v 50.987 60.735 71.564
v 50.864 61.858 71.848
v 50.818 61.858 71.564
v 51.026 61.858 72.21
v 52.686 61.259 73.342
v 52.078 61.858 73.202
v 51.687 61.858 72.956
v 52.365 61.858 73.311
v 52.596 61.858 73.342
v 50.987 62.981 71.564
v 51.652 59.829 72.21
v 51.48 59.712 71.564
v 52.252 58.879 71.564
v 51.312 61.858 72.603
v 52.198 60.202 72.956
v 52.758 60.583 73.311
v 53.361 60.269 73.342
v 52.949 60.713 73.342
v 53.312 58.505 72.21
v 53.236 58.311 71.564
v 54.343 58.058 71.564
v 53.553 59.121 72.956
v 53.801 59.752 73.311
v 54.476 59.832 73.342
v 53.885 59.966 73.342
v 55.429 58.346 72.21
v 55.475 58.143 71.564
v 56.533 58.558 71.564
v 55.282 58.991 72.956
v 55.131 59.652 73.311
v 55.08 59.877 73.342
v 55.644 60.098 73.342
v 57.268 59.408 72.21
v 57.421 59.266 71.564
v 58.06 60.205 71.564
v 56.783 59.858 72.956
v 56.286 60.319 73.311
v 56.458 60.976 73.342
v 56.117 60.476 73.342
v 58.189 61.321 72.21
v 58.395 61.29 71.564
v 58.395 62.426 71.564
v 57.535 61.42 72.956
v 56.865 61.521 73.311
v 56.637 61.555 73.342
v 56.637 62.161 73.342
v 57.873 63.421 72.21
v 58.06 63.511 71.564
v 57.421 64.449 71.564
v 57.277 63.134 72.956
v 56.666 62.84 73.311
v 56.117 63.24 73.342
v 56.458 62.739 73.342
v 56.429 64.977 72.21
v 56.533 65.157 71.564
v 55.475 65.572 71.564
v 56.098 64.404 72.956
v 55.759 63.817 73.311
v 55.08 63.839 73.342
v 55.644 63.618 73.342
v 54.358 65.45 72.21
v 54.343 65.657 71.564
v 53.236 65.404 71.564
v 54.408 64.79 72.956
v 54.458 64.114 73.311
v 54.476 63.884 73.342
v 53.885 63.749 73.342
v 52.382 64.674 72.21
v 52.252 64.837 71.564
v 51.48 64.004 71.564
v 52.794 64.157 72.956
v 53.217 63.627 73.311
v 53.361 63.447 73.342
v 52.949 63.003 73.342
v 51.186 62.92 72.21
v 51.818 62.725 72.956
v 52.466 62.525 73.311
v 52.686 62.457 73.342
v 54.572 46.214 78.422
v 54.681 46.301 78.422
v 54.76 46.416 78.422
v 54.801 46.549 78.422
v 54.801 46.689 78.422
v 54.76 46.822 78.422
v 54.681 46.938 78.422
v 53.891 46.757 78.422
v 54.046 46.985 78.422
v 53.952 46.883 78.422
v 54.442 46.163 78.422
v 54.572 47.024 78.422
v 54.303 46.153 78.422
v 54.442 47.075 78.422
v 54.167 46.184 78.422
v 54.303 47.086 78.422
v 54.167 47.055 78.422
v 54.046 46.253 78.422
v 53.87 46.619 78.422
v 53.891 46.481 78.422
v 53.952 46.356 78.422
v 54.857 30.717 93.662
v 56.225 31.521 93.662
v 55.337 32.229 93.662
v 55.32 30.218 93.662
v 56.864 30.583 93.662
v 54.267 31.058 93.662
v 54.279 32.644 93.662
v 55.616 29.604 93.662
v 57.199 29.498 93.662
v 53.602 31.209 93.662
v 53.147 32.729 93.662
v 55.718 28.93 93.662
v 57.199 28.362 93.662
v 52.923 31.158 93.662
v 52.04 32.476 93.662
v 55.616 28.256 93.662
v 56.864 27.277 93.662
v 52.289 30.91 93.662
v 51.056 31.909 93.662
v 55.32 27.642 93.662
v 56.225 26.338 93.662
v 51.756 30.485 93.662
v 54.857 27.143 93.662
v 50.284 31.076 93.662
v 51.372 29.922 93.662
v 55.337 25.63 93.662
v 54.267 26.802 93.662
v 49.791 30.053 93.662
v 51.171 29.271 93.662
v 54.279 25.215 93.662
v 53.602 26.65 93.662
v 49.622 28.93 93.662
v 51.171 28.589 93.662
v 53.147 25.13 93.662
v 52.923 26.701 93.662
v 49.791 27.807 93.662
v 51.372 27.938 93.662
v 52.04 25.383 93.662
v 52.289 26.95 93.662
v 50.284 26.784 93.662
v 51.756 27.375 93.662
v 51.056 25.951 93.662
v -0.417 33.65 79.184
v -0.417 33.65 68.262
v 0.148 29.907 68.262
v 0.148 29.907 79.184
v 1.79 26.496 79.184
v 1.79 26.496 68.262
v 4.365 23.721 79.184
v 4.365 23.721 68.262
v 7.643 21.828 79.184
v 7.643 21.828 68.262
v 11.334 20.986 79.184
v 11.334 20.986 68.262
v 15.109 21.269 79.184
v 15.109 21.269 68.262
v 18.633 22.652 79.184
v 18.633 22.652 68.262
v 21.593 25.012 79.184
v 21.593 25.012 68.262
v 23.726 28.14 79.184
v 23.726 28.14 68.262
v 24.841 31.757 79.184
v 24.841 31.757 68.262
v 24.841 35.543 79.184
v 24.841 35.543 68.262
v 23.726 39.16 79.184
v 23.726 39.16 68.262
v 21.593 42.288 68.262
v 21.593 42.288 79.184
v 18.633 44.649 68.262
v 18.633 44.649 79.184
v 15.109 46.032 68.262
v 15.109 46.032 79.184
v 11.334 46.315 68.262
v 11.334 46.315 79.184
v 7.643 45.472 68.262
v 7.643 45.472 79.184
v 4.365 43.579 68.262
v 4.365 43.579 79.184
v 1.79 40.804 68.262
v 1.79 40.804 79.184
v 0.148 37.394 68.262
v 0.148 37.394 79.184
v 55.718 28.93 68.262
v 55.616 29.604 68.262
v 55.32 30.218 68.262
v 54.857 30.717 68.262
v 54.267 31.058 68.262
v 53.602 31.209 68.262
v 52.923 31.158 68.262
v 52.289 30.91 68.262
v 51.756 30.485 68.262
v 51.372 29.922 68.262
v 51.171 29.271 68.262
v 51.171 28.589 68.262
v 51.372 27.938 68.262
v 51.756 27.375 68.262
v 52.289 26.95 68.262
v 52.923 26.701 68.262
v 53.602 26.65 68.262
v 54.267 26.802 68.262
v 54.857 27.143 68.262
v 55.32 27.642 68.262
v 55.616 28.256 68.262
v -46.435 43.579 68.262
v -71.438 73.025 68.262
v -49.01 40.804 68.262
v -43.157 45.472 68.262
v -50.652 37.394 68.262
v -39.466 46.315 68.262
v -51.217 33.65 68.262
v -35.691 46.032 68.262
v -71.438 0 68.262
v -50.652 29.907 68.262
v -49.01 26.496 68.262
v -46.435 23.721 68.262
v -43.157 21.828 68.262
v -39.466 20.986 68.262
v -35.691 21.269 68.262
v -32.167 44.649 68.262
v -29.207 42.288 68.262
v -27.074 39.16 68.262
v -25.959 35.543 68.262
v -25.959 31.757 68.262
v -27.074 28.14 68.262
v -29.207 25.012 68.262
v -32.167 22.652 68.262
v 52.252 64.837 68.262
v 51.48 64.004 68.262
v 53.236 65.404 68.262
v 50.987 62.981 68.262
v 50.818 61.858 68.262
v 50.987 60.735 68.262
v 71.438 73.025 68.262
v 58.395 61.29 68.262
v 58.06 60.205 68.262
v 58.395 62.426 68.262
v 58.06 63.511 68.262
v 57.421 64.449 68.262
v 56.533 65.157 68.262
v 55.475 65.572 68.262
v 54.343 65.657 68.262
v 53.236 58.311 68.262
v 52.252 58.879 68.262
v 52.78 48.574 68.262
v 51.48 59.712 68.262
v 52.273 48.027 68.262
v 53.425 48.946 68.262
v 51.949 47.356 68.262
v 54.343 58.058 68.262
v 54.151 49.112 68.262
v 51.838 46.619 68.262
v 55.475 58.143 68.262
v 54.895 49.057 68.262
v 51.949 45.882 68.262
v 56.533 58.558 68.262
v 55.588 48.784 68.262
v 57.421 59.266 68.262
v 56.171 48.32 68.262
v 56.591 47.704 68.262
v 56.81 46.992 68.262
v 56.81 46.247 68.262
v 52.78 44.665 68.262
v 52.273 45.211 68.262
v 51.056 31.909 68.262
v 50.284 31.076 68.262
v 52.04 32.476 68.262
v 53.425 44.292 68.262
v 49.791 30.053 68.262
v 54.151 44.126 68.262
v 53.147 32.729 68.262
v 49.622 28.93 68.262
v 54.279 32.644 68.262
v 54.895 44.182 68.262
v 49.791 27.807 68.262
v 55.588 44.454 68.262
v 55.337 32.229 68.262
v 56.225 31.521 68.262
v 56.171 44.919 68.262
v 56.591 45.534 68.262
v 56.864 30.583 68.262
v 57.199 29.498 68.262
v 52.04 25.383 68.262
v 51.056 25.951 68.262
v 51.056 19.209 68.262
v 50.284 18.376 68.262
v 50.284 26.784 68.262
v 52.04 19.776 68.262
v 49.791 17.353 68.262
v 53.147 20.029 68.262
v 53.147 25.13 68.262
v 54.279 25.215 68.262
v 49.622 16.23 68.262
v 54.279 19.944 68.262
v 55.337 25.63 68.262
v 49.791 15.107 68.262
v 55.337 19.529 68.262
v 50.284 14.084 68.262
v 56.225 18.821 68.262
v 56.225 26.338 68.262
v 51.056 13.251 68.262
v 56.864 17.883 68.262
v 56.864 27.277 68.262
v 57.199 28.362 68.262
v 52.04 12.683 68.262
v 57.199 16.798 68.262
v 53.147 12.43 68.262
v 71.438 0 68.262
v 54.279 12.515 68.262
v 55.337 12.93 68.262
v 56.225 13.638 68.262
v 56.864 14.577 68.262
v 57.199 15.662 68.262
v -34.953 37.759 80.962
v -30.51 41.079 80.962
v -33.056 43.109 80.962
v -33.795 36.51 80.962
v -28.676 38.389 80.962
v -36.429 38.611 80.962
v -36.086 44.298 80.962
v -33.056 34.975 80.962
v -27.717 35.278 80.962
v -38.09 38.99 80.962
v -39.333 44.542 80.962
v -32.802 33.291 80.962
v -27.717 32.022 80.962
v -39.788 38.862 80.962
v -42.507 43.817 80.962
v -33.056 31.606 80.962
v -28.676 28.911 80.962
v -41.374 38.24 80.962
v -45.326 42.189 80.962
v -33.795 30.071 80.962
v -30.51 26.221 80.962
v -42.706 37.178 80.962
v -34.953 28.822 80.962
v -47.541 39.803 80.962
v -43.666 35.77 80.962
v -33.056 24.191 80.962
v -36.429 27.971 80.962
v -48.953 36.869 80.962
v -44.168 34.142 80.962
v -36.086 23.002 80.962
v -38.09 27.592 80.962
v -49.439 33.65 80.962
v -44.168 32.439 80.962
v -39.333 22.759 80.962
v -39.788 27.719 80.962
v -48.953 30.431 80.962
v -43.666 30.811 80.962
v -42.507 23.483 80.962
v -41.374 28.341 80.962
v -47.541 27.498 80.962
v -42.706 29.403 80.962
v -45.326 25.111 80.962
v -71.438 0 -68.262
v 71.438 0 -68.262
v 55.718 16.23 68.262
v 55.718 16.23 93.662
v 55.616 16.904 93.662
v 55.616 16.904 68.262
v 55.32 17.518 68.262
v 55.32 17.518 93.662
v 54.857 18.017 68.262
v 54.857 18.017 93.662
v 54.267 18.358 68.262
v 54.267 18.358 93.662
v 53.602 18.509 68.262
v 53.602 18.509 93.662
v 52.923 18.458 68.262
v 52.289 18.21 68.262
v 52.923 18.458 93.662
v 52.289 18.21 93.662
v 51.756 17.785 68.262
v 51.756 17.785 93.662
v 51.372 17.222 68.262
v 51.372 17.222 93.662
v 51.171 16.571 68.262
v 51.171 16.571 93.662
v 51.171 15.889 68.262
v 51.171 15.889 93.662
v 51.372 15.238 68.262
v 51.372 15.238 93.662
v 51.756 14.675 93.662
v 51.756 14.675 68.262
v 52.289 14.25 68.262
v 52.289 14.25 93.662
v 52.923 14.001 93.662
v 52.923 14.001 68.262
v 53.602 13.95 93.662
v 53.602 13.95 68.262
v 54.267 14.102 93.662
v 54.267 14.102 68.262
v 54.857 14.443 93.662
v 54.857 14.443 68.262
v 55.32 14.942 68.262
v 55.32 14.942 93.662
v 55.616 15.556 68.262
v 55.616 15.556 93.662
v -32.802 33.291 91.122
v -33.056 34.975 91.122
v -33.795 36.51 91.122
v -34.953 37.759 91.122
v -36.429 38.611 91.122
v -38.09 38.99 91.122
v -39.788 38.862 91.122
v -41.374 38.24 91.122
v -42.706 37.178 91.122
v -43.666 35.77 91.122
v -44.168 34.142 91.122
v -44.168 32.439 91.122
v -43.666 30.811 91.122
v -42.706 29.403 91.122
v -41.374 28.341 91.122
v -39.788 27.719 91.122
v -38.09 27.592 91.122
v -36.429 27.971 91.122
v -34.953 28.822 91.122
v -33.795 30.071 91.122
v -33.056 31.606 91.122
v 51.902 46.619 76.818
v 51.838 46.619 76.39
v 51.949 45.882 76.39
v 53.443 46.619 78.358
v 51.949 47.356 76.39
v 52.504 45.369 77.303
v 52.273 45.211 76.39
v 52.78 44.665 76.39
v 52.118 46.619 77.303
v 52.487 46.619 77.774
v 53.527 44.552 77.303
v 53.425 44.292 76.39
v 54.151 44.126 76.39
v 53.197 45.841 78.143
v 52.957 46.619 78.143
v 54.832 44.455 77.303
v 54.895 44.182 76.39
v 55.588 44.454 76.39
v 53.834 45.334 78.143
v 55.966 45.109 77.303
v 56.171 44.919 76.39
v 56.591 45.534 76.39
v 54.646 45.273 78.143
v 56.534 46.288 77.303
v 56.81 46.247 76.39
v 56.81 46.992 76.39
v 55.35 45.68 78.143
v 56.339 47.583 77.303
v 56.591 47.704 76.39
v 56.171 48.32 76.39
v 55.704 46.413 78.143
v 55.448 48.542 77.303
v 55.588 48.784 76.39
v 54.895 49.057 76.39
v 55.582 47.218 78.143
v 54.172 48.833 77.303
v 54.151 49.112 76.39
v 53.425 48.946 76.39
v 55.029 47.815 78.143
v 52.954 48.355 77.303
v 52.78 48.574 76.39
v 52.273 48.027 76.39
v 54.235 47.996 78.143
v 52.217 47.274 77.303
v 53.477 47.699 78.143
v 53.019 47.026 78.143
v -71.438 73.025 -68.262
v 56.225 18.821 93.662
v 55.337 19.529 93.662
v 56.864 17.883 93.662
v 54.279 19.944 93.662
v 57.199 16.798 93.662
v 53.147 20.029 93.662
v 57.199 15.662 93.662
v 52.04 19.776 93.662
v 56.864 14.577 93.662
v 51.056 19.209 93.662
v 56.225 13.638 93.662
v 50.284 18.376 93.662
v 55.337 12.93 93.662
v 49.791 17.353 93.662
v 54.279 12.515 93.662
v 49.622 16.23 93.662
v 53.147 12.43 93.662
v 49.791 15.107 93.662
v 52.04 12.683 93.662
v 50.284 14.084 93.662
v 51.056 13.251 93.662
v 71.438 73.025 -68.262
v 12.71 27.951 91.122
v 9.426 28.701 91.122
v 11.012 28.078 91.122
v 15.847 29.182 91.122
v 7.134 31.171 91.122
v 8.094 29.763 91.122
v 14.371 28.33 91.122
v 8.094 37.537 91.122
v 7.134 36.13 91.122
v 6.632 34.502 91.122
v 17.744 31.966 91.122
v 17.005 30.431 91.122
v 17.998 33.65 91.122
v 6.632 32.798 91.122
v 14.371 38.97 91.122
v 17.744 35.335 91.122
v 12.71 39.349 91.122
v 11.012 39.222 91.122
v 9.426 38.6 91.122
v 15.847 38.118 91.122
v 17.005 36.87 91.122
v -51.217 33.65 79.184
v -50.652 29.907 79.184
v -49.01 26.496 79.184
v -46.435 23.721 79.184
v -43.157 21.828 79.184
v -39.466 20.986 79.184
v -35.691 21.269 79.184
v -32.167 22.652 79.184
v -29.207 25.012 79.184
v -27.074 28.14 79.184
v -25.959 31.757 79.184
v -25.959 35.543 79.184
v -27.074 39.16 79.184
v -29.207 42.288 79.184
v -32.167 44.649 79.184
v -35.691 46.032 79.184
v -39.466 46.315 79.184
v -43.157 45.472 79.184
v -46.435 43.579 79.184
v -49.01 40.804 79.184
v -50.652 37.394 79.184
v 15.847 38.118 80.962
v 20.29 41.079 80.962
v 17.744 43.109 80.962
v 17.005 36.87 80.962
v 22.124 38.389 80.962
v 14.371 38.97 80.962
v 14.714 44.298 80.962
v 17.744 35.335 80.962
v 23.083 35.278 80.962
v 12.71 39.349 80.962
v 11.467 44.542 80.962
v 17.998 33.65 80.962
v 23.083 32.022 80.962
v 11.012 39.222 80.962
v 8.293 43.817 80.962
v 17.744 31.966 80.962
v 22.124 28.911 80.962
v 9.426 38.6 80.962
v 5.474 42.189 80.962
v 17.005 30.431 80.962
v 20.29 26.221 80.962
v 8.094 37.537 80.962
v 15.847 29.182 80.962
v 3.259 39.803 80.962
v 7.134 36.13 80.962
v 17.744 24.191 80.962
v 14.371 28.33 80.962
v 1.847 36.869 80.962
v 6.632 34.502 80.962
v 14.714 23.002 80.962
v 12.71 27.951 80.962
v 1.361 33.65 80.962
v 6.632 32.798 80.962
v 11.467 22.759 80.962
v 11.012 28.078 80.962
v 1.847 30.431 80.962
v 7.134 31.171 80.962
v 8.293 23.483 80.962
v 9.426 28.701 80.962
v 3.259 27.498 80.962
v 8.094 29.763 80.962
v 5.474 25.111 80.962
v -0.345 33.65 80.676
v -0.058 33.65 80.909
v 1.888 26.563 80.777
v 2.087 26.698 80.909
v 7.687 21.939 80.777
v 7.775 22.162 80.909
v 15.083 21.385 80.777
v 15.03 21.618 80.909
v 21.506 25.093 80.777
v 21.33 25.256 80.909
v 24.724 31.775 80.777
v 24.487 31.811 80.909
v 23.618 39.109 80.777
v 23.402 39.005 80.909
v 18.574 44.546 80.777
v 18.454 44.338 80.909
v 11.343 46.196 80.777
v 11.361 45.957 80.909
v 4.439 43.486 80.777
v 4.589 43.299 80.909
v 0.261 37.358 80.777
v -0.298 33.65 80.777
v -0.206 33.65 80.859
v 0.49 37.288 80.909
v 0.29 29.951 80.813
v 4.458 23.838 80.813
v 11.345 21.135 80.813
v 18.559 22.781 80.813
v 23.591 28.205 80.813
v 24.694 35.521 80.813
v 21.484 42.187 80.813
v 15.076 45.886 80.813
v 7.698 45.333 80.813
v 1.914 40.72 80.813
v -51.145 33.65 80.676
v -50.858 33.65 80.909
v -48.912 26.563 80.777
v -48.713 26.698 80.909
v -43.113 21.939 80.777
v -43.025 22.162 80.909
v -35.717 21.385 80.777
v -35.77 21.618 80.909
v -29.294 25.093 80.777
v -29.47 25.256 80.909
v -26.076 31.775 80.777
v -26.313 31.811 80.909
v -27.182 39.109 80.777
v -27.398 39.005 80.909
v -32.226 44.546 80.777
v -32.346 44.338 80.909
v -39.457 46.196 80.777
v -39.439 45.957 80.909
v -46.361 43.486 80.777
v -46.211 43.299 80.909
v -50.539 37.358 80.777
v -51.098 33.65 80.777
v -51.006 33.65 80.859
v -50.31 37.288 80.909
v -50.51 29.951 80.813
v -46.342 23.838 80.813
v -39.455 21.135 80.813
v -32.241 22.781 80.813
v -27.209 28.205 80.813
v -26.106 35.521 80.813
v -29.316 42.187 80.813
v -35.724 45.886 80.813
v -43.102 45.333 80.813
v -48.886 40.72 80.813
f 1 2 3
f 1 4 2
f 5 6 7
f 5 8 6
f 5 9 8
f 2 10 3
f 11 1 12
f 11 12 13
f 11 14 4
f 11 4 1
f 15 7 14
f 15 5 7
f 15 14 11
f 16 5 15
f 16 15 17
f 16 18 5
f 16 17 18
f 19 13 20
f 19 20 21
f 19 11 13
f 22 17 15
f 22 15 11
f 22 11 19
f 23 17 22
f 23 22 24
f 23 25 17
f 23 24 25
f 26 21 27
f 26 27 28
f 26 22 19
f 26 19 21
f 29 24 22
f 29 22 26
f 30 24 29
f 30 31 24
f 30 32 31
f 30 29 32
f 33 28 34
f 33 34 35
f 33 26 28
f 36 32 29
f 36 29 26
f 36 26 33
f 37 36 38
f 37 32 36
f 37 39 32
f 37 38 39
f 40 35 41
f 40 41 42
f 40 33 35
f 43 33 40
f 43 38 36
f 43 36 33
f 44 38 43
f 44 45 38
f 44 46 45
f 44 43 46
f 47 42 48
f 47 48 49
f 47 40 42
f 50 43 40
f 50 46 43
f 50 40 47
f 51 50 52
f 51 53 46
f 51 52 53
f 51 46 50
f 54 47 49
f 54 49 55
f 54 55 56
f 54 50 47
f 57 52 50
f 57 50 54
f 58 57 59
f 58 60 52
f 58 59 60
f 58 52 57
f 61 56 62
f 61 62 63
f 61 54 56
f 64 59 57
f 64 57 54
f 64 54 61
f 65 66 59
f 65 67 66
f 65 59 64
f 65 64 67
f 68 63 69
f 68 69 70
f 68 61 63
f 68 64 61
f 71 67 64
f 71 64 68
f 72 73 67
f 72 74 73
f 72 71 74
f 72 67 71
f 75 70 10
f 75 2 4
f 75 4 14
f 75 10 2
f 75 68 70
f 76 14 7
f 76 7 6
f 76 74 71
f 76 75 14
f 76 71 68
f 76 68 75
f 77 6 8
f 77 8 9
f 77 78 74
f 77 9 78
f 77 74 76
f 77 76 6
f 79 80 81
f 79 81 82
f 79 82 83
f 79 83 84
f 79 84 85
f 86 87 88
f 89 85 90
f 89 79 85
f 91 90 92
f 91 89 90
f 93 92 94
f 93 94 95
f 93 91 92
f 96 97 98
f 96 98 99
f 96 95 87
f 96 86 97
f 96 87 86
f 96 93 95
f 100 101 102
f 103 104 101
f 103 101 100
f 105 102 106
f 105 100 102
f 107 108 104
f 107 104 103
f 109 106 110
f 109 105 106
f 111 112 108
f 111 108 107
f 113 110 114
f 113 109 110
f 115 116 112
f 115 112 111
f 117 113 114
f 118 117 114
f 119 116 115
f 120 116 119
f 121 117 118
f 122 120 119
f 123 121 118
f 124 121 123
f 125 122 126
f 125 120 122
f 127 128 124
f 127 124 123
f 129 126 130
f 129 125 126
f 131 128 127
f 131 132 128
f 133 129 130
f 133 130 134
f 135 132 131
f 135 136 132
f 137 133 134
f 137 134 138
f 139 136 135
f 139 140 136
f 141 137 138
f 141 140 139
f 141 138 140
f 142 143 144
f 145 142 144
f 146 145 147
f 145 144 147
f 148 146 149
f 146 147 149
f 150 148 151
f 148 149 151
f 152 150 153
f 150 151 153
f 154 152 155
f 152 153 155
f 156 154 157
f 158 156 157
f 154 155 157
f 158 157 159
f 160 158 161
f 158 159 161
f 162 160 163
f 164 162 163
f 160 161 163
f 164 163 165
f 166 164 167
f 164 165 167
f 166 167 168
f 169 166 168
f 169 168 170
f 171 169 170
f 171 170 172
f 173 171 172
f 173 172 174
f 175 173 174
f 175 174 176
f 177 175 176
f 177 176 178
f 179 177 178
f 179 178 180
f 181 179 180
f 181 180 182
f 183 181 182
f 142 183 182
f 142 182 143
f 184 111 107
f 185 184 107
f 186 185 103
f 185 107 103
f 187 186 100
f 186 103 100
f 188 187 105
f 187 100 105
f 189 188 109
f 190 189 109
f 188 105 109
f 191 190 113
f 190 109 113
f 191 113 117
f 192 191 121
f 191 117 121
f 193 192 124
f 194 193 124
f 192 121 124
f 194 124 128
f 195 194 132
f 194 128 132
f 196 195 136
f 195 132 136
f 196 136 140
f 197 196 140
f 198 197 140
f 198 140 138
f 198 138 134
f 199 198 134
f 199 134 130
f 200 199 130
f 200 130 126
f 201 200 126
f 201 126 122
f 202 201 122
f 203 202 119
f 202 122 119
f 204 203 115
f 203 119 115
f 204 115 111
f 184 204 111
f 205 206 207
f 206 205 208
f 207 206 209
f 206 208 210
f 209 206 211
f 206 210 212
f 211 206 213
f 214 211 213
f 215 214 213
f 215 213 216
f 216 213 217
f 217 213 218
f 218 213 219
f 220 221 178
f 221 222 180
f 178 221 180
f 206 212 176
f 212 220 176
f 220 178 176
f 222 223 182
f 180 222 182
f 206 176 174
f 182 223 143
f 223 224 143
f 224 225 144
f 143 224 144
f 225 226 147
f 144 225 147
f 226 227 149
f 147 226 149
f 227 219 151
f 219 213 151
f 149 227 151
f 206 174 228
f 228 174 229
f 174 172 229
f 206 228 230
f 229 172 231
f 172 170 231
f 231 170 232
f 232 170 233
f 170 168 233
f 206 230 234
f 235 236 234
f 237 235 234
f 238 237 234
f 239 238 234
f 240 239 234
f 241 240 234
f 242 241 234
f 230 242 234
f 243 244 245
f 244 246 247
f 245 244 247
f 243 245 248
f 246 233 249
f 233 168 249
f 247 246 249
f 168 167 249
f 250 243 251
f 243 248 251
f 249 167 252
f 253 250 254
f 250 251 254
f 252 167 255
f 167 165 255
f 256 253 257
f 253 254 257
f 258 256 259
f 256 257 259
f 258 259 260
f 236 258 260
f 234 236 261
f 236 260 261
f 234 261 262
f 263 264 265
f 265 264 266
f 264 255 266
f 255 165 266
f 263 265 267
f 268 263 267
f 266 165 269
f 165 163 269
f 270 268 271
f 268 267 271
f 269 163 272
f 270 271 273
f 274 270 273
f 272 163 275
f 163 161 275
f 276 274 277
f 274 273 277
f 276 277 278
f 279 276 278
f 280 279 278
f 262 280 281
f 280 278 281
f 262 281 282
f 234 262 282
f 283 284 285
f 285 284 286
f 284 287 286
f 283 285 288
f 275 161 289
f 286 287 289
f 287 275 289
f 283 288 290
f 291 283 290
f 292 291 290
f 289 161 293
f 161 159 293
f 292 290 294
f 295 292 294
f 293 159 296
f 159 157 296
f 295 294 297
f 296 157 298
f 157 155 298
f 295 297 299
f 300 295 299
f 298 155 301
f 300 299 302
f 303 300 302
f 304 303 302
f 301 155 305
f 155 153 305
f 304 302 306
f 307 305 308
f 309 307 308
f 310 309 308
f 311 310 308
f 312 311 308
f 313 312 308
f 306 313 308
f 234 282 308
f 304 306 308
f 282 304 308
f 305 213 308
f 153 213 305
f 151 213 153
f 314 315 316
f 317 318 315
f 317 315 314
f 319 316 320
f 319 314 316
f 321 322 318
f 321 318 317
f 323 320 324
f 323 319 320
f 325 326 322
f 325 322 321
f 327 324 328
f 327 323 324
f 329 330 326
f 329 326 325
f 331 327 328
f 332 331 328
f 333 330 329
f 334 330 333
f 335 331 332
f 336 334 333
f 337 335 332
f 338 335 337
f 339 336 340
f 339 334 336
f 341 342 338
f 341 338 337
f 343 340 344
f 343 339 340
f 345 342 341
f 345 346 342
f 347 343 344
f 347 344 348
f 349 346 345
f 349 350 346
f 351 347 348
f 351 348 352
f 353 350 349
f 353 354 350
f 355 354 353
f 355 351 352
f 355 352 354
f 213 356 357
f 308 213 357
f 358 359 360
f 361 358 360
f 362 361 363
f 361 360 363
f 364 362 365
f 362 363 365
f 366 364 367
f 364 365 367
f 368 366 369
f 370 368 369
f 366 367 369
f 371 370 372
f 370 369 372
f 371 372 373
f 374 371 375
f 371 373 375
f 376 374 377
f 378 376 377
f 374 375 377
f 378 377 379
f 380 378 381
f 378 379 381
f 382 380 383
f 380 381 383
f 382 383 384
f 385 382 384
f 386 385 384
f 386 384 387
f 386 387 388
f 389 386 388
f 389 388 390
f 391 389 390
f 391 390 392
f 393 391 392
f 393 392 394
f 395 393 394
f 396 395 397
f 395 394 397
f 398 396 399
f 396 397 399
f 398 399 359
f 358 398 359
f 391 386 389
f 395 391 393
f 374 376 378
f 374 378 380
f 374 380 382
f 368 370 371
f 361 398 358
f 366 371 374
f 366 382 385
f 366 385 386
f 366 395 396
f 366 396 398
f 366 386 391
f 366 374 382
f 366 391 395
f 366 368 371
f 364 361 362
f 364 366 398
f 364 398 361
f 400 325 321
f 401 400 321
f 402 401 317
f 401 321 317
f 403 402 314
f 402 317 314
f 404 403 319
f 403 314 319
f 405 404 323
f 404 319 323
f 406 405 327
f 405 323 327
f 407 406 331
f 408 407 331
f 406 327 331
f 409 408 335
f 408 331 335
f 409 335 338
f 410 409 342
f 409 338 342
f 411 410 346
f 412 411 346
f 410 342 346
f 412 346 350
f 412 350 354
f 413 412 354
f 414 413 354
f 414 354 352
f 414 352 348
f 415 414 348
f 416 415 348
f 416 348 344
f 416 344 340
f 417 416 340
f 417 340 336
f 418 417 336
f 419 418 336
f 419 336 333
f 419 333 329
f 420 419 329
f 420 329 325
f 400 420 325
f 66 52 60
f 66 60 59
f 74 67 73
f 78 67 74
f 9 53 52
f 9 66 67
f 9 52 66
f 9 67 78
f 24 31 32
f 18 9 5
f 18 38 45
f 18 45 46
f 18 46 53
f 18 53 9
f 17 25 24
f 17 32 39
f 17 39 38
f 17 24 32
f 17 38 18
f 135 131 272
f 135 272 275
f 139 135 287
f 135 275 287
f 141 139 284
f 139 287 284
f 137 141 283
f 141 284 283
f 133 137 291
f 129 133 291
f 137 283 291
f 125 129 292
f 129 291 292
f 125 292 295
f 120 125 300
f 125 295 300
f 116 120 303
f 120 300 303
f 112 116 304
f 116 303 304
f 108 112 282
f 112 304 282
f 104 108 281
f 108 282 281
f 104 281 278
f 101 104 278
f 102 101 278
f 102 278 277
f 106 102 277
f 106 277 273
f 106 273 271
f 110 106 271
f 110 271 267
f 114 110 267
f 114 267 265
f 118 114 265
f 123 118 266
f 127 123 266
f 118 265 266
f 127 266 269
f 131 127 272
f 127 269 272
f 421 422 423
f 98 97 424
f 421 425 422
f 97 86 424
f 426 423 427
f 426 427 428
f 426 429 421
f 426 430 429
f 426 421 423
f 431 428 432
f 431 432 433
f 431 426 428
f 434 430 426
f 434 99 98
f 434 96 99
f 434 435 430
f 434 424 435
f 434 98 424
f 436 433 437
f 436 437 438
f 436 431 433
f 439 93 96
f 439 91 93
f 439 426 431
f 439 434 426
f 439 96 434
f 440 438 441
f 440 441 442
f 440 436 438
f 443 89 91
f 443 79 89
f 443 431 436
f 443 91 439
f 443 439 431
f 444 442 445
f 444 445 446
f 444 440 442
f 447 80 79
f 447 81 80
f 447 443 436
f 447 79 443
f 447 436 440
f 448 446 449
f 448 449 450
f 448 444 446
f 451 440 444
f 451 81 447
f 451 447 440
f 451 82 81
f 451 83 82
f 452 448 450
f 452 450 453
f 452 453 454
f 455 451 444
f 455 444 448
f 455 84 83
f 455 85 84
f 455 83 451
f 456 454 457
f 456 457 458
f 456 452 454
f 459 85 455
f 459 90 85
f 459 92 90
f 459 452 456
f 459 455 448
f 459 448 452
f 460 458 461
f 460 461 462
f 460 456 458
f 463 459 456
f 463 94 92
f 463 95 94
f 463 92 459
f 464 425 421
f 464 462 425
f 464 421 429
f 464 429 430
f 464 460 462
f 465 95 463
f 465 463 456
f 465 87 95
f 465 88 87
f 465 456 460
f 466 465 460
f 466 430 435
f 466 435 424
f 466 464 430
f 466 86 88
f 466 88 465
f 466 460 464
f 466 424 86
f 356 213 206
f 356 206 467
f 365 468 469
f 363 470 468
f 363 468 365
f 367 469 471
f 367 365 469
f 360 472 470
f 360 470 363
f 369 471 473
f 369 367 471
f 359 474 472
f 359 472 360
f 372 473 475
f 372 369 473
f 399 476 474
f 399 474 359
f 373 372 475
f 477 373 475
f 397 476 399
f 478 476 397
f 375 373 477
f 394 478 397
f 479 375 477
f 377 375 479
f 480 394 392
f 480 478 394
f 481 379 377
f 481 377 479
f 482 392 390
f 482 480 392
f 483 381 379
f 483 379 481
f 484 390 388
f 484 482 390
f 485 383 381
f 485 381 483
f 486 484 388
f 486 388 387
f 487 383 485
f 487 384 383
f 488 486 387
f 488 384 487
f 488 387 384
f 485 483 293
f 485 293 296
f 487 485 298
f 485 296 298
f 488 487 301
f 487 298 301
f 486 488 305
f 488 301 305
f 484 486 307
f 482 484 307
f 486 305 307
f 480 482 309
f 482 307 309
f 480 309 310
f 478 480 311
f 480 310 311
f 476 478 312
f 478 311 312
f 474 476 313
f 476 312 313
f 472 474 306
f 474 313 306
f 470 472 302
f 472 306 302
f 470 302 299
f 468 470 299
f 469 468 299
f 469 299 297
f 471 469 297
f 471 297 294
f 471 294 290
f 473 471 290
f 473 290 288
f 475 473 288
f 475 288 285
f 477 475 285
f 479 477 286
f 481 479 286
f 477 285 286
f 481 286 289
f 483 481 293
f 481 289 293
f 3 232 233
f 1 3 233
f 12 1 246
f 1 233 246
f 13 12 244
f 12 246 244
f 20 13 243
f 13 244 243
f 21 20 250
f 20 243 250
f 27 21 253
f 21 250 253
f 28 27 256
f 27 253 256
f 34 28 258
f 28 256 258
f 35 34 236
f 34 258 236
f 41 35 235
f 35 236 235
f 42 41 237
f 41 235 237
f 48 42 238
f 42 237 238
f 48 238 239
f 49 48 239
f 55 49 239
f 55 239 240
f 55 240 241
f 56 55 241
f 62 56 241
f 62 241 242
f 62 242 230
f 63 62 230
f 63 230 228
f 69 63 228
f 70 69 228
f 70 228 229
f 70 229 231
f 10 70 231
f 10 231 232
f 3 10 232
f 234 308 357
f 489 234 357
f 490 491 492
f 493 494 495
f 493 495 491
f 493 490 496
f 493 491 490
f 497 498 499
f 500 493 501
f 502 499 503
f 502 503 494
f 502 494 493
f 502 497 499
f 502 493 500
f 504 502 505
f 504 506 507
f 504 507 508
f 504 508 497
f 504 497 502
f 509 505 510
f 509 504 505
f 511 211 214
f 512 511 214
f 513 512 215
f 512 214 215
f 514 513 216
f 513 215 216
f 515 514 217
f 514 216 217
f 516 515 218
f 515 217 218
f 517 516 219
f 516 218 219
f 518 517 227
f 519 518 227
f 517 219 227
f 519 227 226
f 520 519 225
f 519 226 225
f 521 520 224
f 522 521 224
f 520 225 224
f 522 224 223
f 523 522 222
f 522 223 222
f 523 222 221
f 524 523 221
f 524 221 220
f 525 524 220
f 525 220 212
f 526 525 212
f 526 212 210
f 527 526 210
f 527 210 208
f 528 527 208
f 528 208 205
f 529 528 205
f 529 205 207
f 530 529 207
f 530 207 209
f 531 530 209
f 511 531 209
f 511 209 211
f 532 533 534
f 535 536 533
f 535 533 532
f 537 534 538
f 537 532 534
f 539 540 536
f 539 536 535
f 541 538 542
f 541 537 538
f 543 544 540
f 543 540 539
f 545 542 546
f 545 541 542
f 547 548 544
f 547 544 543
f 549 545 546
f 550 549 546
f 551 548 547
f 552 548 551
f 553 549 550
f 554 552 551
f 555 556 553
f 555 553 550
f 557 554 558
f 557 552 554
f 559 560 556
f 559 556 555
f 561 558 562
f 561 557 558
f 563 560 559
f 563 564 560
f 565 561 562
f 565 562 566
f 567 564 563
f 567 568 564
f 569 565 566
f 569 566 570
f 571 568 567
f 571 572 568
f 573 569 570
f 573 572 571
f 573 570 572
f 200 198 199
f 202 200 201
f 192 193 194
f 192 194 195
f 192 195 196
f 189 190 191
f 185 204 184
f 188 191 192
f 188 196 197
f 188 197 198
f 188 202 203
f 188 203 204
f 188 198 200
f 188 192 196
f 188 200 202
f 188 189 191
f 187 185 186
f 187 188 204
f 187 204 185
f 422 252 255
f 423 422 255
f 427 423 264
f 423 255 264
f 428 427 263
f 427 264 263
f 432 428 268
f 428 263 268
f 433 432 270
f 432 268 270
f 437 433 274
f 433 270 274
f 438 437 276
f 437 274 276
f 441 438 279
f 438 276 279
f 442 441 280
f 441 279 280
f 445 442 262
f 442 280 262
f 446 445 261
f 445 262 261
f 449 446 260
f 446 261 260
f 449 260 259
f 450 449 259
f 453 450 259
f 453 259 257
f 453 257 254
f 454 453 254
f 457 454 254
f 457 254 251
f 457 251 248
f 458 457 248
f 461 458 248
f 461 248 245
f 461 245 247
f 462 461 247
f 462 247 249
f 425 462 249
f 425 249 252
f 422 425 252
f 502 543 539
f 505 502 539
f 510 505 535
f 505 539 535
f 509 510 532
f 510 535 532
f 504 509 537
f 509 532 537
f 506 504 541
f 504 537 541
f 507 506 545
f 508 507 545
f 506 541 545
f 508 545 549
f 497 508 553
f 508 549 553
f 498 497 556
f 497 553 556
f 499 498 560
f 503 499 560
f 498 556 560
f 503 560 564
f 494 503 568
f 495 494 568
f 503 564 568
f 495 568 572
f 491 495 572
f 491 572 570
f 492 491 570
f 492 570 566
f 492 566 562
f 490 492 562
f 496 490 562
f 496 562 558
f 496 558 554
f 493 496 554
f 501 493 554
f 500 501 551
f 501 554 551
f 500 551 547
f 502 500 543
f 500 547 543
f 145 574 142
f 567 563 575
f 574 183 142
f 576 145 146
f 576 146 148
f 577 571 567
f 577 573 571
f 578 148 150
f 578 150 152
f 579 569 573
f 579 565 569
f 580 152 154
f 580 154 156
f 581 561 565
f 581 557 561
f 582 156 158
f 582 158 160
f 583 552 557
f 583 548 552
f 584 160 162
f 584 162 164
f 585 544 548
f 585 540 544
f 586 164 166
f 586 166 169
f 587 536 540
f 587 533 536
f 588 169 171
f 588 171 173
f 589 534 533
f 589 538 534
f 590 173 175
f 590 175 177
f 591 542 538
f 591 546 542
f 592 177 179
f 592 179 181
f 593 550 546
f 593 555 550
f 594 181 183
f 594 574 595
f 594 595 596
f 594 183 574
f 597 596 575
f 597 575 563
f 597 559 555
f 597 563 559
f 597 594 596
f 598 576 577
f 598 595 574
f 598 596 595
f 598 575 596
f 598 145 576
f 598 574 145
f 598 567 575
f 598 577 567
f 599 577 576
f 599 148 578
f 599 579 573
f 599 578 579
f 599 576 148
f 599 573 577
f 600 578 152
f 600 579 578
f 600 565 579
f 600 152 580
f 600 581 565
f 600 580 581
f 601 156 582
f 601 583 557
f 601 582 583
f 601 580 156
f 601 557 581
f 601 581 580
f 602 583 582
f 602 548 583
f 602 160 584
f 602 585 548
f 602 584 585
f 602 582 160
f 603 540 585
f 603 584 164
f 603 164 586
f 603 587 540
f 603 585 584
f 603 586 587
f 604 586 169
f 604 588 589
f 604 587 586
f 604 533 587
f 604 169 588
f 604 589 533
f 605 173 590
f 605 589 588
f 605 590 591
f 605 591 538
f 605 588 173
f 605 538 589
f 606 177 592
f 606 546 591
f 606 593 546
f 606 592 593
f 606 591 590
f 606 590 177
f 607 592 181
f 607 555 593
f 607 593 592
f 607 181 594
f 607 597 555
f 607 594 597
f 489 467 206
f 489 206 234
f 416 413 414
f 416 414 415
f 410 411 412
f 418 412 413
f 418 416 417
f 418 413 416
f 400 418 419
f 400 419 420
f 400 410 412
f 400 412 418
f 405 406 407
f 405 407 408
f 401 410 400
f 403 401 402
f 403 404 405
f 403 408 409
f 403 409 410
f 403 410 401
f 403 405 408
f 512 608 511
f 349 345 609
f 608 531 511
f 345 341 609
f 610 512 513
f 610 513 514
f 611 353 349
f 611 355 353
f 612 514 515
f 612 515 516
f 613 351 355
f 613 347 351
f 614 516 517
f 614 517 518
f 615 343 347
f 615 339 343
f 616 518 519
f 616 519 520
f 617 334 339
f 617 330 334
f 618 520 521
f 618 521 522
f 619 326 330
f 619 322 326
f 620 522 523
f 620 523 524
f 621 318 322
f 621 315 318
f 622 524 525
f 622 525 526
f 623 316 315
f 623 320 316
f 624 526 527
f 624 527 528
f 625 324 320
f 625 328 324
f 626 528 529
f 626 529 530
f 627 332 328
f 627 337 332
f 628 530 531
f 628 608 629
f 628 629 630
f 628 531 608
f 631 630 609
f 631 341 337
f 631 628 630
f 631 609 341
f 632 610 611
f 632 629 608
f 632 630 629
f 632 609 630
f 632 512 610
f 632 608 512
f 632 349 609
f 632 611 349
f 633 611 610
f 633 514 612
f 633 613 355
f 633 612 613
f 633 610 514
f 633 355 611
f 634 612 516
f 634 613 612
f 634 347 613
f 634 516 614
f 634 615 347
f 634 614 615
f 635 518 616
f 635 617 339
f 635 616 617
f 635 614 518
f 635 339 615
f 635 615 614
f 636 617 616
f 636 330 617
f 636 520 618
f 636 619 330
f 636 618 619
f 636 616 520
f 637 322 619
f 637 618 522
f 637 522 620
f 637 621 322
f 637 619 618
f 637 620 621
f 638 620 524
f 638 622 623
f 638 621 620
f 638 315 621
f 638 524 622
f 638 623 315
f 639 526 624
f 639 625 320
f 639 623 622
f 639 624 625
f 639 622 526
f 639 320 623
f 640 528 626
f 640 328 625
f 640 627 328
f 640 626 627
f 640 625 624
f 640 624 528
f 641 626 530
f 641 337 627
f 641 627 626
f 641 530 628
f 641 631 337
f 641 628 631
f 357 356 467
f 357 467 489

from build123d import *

# Parameters (mm, degrees)
SKETCH1_W           = 142.875
SKETCH1_H           = 136.525
BOSS_EXTRUDE1_DEPTH = 73.025
SKETCH2_R           = 12.7
BOSS_EXTRUDE2_DEPTH = 12.7
FILLET2_SIZE        = 1.778
SKETCH3_R           = 5.715
BOSS_EXTRUDE3_DEPTH = 22.86
LPATTERN1_COUNT     = 2
LPATTERN1_PITCH     = 50.8
FILLET3_SIZE        = 1.778
SKETCH5_R           = 5.715
BOSS_EXTRUDE4_DEPTH = 10.16
SKETCH6_R           = 3.81
BOSS_EXTRUDE5_DEPTH = 5.08
FILLET4_SIZE        = 1.778
SKETCH7_R           = 2.5
BOSS_EXTRUDE6_DEPTH = 10.16
FILLET5_SIZE        = 2.032
SKETCH9_R           = 3.81
BOSS_EXTRUDE7_DEPTH = 25.4
SKETCH10_R          = 2.286
CUT_EXTRUDE1_DEPTH  = 25.4
LPATTERN2_COUNT     = 2
LPATTERN2_PITCH     = 12.7
SKETCH11_R          = 2.286
CUT_EXTRUDE2_DEPTH  = 25.4


with BuildPart() as part:
    # Sketch1 → Boss-Extrude1 (new body)
    with BuildSketch(Plane(origin=(0, 0, 0), x_dir=(1, 0, 0), z_dir=(0, 1, 0))):
        Rectangle(SKETCH1_W, SKETCH1_H)
    extrude(amount=BOSS_EXTRUDE1_DEPTH)

    # Sketch2 → Boss-Extrude2 (add)
    with BuildSketch(Plane.XY.offset(68.2625)):
        with Locations(Location((-38.516675306, 33.650171928, 0), (0, 0, 180))):
            Circle(SKETCH2_R)
    boss_extrude2 = extrude(amount=BOSS_EXTRUDE2_DEPTH)

    # Fillet2
    # a fillet whose section is not a circle: 1.778 mm, written as the material it takes off along each edge
    with BuildSketch(Plane(origin=(-38.516675306, 33.650171928, 80.9625), x_dir=(-1, 0, 0), z_dir=(0, 1, 0))) as fillet2_piece_1:
        with BuildLine():
            Bezier((12.7, -FILLET2_SIZE), (12.7, 0), (12.7 - FILLET2_SIZE, 0), weights=[1, 4.949747468, 1])
            Line((12.7 - FILLET2_SIZE, 0), (12.7, 0))
            Line((12.7, 0), (12.7, -FILLET2_SIZE))
        make_face()
    revolve(axis=Axis((-38.516675306, 33.650171928, 80.9625), (0, 0, 1)), mode=Mode.SUBTRACT)

    # Sketch3 → Boss-Extrude3 (add)
    with BuildSketch(Plane.XY.offset(68.2625)):
        with Locations((-38.516675306, 33.290572788)):
            Circle(SKETCH3_R)
    extrude(amount=BOSS_EXTRUDE3_DEPTH)

    # LPattern1: Boss-Extrude2 ×2
    with Locations(*[(i * LPATTERN1_PITCH, 0, 0) for i in range(1, LPATTERN1_COUNT)]):
        add(boss_extrude2)

    # Fillet3
    # a fillet whose section is not a circle: 1.778 mm, written as the material it takes off along each edge
    with BuildSketch(Plane(origin=(12.283324694, 33.650171928, 80.9625), x_dir=(-1, 0, 0), z_dir=(0, 1, 0))) as fillet3_piece_1:
        with BuildLine():
            Bezier((12.7, -FILLET3_SIZE), (12.7, 0), (12.7 - FILLET3_SIZE, 0), weights=[1, 4.949747468, 1])
            Line((12.7 - FILLET3_SIZE, 0), (12.7, 0))
            Line((12.7, 0), (12.7, -FILLET3_SIZE))
        make_face()
    revolve(axis=Axis((12.283324694, 33.650171928, 80.9625), (0, 0, 1)), mode=Mode.SUBTRACT)

    # Sketch5 → Boss-Extrude4 (add)
    with BuildSketch(Plane.XY.offset(80.9625)):
        with Locations((12.283324694, 33.650171928)):
            Circle(SKETCH5_R)
    extrude(amount=BOSS_EXTRUDE4_DEPTH)

    # Sketch6 → Boss-Extrude5 (add)
    with BuildSketch(Plane.XY.offset(68.2625)):
        with Locations(Location((54.627573576, 61.857843882, 0), (0, 0, 180))):
            Circle(SKETCH6_R)
    extrude(amount=BOSS_EXTRUDE5_DEPTH)

    # Fillet4
    # a fillet whose section is not a circle: 1.778 mm, written as the material it takes off along each edge
    with BuildSketch(Plane(origin=(54.627573576, 61.857843882, 73.3425), x_dir=(-1, 0, 0), z_dir=(0, 1, 0))) as fillet4_piece_1:
        with BuildLine():
            Bezier((3.81, -FILLET4_SIZE), (3.81, 0), (3.81 - FILLET4_SIZE, 0), weights=[1, 0.449977043, 1])
            Line((3.81 - FILLET4_SIZE, 0), (3.81, 0))
            Line((3.81, 0), (3.81, -FILLET4_SIZE))
        make_face()
    revolve(axis=Axis((54.627573576, 61.857843882, 73.3425), (0, 0, 1)), mode=Mode.SUBTRACT)

    # Sketch7 → Boss-Extrude6 (add)
    with BuildSketch(Plane.XY.offset(68.2625)):
        with Locations(Location((54.338250319, 46.619193899, 0), (0, 0, 180))):
            Circle(SKETCH7_R)
    extrude(amount=BOSS_EXTRUDE6_DEPTH)

    # Fillet5
    # a fillet whose section is not a circle: 2.032 mm, written as the material it takes off along each edge
    with BuildSketch(Plane(origin=(54.338250319, 46.619193899, 78.4225), x_dir=(-1, 0, 0), z_dir=(0, 1, 0))) as fillet5_piece_1:
        with BuildLine():
            Bezier((2.5, -FILLET5_SIZE), (2.5, 0), (2.5 - FILLET5_SIZE, 0), weights=[1, 0.565685425, 1])
            Line((2.5 - FILLET5_SIZE, 0), (2.5, 0))
            Line((2.5, 0), (2.5, -FILLET5_SIZE))
        make_face()
    revolve(axis=Axis((54.338250319, 46.619193899, 78.4225), (0, 0, 1)), mode=Mode.SUBTRACT)

    # Sketch9 → Boss-Extrude7 (add)
    with BuildSketch(Plane.XY.offset(68.2625)):
        with Locations(Location((53.431620425, 28.929804746, 0), (0, 0, 180))):
            Circle(SKETCH9_R)
    boss_extrude7 = extrude(amount=BOSS_EXTRUDE7_DEPTH)

    # Sketch10 → Cut-Extrude1 (cut)
    with BuildSketch(Plane.XY.offset(93.6625)):
        with Locations((53.431620425, 28.929804746)):
            Circle(SKETCH10_R)
    extrude(amount=-CUT_EXTRUDE1_DEPTH, mode=Mode.SUBTRACT)

    # LPattern2: Boss-Extrude7 ×2
    with Locations(*[(0, -i * LPATTERN2_PITCH, 0) for i in range(1, LPATTERN2_COUNT)]):
        add(boss_extrude7)

    # Sketch11 → Cut-Extrude2 (cut)
    with BuildSketch(Plane.XY.offset(93.6625)):
        with Locations((53.431620425, 16.229804746)):
            Circle(SKETCH11_R)
    extrude(amount=-CUT_EXTRUDE2_DEPTH, mode=Mode.SUBTRACT)


solid = part.part
